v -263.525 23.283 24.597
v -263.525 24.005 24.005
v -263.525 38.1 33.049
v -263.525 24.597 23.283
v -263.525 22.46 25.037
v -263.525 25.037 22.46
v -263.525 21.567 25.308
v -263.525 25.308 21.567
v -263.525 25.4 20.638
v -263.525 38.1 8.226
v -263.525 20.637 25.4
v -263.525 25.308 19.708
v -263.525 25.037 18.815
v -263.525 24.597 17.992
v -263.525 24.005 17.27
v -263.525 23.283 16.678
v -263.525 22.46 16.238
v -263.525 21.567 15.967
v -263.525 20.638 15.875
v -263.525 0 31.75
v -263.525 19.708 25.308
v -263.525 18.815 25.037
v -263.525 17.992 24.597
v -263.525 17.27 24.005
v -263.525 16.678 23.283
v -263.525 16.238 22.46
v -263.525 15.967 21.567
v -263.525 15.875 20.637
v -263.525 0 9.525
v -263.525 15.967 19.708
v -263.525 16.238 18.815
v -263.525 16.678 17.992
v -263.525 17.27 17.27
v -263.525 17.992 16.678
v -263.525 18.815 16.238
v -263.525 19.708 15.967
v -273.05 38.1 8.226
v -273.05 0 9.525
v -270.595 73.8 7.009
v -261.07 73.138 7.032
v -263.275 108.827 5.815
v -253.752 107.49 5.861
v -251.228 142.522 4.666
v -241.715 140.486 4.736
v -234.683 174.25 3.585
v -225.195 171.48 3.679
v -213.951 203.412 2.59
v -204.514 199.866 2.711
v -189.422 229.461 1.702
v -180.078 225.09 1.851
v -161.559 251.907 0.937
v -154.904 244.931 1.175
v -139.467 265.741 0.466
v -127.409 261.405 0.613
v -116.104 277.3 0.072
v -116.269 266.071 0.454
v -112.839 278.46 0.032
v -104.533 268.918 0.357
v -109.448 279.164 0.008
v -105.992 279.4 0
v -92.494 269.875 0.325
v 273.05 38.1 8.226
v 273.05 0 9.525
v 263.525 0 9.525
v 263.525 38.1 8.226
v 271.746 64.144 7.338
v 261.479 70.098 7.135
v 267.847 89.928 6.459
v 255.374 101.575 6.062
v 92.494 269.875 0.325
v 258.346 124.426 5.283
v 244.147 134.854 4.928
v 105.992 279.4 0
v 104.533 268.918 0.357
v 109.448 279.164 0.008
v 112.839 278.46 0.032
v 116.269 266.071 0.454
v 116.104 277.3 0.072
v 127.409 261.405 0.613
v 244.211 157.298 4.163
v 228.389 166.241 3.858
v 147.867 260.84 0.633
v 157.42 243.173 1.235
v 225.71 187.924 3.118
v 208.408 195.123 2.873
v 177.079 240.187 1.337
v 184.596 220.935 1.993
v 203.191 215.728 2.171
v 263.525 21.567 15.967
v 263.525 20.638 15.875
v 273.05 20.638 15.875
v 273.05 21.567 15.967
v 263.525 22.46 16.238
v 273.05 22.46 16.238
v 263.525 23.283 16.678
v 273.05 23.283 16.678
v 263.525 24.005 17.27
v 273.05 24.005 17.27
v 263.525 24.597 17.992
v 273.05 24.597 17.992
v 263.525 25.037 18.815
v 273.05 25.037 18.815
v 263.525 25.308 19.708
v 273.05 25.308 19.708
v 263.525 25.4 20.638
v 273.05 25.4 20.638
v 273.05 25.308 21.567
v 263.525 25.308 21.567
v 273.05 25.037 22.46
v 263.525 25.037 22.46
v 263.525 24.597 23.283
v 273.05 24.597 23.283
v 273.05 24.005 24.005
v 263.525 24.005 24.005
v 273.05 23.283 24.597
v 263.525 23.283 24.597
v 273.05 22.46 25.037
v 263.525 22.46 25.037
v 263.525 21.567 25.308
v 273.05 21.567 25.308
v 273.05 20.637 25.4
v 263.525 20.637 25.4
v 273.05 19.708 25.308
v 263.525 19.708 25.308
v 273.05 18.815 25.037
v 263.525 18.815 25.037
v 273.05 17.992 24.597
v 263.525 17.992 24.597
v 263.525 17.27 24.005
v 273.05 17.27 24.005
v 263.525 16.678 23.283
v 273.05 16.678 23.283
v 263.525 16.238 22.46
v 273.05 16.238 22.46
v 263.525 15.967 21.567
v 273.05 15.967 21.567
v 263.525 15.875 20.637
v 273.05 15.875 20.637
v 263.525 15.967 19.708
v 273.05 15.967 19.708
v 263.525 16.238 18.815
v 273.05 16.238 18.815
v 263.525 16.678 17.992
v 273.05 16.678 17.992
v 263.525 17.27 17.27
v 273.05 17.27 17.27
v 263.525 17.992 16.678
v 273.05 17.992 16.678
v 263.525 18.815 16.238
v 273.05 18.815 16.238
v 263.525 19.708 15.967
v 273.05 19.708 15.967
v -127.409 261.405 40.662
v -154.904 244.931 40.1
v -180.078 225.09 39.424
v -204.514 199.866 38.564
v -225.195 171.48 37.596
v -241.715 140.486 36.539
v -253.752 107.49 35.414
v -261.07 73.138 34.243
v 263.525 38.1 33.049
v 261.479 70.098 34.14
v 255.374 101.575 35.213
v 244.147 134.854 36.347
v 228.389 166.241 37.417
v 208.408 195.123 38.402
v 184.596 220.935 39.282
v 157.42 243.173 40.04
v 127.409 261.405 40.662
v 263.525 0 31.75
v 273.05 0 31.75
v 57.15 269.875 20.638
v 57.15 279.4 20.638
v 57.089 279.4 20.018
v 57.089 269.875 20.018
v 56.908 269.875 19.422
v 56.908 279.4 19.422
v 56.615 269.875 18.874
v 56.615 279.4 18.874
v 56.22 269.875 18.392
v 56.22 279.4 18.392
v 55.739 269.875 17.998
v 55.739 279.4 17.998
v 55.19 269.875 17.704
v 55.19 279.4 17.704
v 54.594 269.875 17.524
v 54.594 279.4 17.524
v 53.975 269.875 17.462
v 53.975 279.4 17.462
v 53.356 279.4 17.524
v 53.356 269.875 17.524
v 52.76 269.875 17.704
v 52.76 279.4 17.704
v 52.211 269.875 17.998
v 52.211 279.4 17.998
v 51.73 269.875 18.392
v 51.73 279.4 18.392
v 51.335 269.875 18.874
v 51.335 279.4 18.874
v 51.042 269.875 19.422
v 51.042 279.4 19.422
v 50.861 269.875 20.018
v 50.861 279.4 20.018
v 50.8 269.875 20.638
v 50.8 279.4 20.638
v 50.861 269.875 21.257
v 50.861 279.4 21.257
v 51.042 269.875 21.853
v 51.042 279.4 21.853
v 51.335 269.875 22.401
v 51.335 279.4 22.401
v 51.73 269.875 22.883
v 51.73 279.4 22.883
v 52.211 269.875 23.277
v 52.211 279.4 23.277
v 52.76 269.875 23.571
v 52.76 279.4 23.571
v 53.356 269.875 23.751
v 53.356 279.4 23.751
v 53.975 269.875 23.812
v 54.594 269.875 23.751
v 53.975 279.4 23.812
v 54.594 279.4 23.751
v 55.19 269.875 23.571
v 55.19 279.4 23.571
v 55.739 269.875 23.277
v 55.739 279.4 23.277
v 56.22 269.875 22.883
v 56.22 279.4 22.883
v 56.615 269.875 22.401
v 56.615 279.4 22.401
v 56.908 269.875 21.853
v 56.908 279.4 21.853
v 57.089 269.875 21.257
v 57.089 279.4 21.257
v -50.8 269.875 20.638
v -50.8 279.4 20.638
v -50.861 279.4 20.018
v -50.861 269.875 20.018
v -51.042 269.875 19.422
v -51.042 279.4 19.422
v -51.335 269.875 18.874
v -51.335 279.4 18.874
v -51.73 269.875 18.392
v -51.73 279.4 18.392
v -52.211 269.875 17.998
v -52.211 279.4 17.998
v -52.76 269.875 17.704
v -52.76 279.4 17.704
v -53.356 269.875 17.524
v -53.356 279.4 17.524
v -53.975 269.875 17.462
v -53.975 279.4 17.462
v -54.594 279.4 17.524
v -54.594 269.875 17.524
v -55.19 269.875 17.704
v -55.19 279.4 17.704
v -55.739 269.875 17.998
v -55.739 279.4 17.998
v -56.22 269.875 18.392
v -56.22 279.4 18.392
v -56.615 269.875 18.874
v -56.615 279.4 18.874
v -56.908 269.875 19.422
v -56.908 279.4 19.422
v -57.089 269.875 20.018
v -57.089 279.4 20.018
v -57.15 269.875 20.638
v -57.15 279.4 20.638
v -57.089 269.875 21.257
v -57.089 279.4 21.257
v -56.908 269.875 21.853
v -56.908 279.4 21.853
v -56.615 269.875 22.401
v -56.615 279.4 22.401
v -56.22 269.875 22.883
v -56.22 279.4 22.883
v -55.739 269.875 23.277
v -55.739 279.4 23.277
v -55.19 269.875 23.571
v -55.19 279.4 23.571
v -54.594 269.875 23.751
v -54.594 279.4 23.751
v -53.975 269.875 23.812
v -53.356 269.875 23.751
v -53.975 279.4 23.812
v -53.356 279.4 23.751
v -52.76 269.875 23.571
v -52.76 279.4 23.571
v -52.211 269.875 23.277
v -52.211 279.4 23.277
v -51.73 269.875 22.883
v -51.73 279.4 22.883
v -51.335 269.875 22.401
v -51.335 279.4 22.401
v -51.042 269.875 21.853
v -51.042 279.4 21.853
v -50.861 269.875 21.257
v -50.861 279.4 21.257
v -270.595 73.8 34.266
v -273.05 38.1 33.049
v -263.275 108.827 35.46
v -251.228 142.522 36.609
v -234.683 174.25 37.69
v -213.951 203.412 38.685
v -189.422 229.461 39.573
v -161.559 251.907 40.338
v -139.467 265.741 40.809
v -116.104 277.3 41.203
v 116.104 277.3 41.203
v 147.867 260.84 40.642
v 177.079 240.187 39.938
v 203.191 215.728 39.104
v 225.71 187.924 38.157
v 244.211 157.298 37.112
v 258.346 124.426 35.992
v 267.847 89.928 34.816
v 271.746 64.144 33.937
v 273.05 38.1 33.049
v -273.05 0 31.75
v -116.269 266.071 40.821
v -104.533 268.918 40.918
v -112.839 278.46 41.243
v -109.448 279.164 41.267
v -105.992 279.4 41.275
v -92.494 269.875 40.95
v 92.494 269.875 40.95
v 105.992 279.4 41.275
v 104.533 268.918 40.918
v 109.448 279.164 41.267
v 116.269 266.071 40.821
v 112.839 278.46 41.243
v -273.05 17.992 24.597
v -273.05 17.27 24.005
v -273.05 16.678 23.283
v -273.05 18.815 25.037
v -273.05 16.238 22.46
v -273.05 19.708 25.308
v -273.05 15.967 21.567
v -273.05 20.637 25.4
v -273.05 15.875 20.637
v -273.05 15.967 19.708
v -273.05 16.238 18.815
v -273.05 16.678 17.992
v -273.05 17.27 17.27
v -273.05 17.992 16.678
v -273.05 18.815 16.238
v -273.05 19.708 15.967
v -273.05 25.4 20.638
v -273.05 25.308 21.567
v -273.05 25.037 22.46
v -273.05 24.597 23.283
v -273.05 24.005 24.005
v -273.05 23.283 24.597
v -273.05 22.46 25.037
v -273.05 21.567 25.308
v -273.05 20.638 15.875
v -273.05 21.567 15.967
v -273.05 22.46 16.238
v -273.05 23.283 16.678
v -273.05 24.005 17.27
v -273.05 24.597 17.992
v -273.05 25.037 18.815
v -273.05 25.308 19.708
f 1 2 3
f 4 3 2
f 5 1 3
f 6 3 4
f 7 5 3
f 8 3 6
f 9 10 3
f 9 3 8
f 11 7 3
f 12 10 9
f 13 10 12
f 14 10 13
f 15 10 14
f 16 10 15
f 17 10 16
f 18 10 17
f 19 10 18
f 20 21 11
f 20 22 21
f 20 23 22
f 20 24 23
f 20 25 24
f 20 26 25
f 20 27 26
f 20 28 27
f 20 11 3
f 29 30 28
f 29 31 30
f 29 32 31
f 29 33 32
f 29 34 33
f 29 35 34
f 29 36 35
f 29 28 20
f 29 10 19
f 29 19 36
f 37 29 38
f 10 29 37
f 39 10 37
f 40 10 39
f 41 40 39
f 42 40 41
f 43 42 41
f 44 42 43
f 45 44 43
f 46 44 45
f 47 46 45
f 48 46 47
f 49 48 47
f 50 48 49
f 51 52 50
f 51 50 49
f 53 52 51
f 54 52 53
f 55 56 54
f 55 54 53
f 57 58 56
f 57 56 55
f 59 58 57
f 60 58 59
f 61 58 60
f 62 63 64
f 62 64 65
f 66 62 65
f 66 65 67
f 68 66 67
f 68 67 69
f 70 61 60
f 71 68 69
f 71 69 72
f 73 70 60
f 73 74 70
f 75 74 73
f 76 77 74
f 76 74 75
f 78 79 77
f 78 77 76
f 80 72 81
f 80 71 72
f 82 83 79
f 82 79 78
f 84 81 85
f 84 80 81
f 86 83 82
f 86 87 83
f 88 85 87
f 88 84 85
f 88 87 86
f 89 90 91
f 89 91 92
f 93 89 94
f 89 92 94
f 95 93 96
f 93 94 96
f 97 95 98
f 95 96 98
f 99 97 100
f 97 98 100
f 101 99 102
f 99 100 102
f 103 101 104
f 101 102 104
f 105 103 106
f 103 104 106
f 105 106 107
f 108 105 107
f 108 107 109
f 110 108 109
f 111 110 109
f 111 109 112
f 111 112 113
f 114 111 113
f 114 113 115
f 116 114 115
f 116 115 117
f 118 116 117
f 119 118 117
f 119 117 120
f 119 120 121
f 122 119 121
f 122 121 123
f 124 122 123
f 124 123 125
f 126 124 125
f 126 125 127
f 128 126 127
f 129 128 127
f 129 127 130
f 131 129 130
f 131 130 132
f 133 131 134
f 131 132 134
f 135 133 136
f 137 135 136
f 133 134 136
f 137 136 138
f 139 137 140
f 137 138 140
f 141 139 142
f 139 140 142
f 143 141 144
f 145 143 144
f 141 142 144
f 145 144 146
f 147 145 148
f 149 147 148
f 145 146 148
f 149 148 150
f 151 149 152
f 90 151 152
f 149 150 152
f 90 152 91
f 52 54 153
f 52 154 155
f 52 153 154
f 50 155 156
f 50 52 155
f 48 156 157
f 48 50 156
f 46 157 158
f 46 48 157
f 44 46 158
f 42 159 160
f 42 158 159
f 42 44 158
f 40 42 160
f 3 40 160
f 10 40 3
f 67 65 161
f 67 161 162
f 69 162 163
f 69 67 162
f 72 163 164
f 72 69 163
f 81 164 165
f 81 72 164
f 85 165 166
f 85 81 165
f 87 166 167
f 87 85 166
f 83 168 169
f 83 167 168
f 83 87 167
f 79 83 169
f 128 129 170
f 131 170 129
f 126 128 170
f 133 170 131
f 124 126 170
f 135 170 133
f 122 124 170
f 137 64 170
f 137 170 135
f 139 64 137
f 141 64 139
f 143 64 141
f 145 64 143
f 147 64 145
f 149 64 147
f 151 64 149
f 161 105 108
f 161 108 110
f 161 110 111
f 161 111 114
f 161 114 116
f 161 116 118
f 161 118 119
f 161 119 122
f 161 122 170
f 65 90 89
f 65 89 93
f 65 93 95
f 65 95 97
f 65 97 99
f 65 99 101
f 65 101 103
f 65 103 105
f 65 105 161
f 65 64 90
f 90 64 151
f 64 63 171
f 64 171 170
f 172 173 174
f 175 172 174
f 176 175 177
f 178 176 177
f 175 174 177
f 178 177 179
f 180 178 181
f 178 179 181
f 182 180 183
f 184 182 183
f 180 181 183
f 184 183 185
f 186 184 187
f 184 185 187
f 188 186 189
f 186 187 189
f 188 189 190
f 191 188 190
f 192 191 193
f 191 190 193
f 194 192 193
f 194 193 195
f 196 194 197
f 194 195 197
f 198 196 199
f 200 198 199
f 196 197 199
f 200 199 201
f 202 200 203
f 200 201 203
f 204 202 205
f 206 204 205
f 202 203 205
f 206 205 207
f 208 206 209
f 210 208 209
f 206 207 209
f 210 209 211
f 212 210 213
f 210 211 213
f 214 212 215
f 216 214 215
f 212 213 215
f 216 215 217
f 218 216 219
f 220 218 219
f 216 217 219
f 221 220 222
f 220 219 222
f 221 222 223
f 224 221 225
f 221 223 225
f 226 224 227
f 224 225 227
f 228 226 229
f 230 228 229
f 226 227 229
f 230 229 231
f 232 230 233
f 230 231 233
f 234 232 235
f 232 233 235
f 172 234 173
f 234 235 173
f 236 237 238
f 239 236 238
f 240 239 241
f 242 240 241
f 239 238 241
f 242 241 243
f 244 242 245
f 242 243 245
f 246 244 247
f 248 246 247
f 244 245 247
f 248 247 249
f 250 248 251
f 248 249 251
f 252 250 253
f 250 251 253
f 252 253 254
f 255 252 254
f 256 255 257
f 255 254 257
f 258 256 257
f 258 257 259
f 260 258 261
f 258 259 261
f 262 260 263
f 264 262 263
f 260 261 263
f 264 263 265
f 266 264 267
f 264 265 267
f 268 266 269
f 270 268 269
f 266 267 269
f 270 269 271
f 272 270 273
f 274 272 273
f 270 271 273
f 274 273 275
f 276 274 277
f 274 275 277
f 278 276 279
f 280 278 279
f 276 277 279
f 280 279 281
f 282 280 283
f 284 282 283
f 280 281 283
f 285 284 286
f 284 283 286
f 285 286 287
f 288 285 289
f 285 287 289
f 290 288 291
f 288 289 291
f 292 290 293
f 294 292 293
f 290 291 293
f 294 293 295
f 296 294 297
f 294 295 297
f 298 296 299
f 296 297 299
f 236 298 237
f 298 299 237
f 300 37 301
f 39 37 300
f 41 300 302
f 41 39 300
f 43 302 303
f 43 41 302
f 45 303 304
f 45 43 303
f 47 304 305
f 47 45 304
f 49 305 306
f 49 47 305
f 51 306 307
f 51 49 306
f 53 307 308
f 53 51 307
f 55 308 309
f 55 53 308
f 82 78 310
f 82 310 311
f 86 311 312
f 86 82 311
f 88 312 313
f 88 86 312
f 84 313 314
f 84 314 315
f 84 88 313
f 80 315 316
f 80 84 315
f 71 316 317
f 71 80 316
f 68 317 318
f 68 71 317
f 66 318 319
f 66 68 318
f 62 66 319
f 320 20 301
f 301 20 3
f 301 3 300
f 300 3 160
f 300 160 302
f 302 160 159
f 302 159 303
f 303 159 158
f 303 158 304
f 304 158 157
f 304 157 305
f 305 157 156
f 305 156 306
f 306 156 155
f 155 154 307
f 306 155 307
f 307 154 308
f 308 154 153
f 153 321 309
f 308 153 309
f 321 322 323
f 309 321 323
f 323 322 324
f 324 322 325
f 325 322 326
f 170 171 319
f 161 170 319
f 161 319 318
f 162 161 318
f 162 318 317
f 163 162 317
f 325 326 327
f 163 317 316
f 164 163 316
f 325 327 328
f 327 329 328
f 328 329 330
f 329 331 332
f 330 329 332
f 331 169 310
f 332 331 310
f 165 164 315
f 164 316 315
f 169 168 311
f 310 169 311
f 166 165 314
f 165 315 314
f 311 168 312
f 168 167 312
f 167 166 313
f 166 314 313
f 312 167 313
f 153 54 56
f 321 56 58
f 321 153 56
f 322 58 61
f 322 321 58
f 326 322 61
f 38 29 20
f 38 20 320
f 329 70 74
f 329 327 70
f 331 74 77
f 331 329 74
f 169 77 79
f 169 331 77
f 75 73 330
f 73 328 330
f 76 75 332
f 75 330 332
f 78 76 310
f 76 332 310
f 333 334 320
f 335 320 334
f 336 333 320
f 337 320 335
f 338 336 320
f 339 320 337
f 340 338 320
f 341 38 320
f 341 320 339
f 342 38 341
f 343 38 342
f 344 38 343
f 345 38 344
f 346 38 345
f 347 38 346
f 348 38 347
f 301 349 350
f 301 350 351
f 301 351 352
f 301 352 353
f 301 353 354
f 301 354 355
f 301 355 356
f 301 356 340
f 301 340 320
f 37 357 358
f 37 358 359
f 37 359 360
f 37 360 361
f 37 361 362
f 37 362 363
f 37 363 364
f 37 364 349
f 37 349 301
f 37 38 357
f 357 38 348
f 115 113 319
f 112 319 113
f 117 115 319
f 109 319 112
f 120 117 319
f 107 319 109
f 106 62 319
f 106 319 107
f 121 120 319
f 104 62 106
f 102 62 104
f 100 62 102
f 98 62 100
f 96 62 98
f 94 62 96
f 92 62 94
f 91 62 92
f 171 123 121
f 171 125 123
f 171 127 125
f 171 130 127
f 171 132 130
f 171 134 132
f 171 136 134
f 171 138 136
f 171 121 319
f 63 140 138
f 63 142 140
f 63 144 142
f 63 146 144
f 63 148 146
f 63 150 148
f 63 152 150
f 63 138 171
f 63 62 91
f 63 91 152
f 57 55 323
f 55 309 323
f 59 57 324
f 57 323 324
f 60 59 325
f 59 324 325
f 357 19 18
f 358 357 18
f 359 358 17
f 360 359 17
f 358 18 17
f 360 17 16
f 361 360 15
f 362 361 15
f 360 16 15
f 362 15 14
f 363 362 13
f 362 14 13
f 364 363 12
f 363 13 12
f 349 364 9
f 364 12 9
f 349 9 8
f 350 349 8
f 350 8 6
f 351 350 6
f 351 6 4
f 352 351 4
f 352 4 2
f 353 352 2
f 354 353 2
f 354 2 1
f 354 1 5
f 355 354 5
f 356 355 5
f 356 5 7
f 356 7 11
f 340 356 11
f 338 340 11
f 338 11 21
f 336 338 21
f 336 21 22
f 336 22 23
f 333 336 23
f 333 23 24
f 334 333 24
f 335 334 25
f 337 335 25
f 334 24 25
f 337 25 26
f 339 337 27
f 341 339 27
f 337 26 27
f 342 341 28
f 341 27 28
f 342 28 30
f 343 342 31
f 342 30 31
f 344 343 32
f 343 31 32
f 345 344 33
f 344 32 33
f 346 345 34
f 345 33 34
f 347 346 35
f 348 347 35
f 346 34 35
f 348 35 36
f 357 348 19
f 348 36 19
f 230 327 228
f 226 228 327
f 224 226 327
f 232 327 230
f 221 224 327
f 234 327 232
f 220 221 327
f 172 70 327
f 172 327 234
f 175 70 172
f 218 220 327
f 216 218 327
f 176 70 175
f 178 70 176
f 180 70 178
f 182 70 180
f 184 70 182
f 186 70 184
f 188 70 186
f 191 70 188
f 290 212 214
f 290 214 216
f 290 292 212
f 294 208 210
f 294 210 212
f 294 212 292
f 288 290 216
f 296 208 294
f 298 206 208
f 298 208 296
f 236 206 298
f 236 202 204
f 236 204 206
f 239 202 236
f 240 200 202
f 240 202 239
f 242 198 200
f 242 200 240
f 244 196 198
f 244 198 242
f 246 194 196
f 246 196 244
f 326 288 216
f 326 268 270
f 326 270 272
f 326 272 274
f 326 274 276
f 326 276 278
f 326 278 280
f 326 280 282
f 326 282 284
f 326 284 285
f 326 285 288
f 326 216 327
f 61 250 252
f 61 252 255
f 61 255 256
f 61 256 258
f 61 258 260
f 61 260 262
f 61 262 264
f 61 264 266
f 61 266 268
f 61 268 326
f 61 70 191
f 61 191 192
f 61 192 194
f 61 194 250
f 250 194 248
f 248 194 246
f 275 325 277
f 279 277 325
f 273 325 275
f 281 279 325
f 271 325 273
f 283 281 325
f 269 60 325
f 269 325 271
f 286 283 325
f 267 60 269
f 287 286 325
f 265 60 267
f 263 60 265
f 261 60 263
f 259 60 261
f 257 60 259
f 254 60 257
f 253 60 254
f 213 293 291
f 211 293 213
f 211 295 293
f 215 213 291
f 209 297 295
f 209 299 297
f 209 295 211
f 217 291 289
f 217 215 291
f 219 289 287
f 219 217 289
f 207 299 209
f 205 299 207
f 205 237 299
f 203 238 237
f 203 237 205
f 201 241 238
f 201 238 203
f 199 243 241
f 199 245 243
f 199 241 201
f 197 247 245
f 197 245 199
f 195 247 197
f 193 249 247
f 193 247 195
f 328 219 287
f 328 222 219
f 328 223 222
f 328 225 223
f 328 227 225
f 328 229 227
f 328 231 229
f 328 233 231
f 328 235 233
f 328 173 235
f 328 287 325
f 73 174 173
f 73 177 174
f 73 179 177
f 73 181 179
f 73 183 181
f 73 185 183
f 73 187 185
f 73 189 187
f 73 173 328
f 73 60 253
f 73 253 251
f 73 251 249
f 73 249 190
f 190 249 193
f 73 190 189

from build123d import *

# Parameters (mm, degrees)
BOSS_EXTRUDE1_DEPTH = 41.275
SKETCH3_R           = 4.7625
CUT_EXTRUDE1_DEPTH  = 547.1
FILLET2_R           = 76.2
FILLET3_R           = 25.4
SKETCH7_R           = 3.175
CUT_EXTRUDE2_DEPTH  = 9.525


with BuildPart() as part:
    # Sketch2 → Boss-Extrude1 (new body)
    with BuildSketch(Plane.XY):
        with BuildLine():
            Line((-273.05, 0), (-273.05, 38.1))
            ThreePointArc((-273.05, 38.1), (-228.817032973, 183.397449758), (-111.125, 279.4))
            Line((-111.125, 279.4), (0, 279.4))
            Line((0, 279.4), (111.125, 279.4))
            ThreePointArc((111.125, 279.4), (228.817032973, 183.397449758), (273.05, 38.1))
            Line((273.05, 38.1), (273.05, 0))
            Line((273.05, 0), (263.525, 0))
            Line((263.525, 0), (263.525, 38.1))
            ThreePointArc((263.525, 38.1), (221.424095798, 177.317474829), (109.231868051, 269.875))
            Line((109.231868051, 269.875), (0, 269.875))
            Line((0, 269.875), (-109.231868051, 269.875))
            ThreePointArc((-109.231868051, 269.875), (-221.424095798, 177.317474829), (-263.525, 38.1))
            Line((-263.525, 38.1), (-263.525, 0))
            Line((-263.525, 0), (-273.05, 0))
        make_face()
    extrude(amount=BOSS_EXTRUDE1_DEPTH)

    # Sketch3 → Cut-Extrude1 (cut, through all)
    with BuildSketch(Plane(origin=(273.05, 0, 0), x_dir=(0, 0, -1), z_dir=(1, 0, 0))):
        with Locations((-20.6375, 20.6375)):
            Circle(SKETCH3_R)
        Polygon((0, 0), (-9.525, 0), (0, 279.4), align=None)
        Polygon((-31.75, 0), (-41.275, 279.4), (-41.275, 0), align=None)
    extrude(amount=-CUT_EXTRUDE1_DEPTH, mode=Mode.SUBTRACT)

    # Fillet2
    fillet2_edges = [part.edges().sort_by_distance(p)[0] for p in [
        (109.231868051, 269.875, 20.6375),
        (-109.231868051, 269.875, 20.6375),
    ]]
    fillet(fillet2_edges, radius=FILLET2_R)

    # Fillet3
    fillet3_edges = [part.edges().sort_by_distance(p)[0] for p in [
        (111.125, 279.4, 20.6375),
        (-111.125, 279.4, 20.6375),
    ]]
    fillet(fillet3_edges, radius=FILLET3_R)

    # Sketch7 → Cut-Extrude2 (cut)
    with BuildSketch(Plane(origin=(0, 279.4, 0), x_dir=(1, 0, 0), z_dir=(0, 1, 0))):
        with Locations((-53.975, -20.6375)):
            Circle(SKETCH7_R)
        with Locations((53.975, -20.6375)):
            Circle(SKETCH7_R)
    extrude(amount=-CUT_EXTRUDE2_DEPTH, mode=Mode.SUBTRACT)


solid = part.part
